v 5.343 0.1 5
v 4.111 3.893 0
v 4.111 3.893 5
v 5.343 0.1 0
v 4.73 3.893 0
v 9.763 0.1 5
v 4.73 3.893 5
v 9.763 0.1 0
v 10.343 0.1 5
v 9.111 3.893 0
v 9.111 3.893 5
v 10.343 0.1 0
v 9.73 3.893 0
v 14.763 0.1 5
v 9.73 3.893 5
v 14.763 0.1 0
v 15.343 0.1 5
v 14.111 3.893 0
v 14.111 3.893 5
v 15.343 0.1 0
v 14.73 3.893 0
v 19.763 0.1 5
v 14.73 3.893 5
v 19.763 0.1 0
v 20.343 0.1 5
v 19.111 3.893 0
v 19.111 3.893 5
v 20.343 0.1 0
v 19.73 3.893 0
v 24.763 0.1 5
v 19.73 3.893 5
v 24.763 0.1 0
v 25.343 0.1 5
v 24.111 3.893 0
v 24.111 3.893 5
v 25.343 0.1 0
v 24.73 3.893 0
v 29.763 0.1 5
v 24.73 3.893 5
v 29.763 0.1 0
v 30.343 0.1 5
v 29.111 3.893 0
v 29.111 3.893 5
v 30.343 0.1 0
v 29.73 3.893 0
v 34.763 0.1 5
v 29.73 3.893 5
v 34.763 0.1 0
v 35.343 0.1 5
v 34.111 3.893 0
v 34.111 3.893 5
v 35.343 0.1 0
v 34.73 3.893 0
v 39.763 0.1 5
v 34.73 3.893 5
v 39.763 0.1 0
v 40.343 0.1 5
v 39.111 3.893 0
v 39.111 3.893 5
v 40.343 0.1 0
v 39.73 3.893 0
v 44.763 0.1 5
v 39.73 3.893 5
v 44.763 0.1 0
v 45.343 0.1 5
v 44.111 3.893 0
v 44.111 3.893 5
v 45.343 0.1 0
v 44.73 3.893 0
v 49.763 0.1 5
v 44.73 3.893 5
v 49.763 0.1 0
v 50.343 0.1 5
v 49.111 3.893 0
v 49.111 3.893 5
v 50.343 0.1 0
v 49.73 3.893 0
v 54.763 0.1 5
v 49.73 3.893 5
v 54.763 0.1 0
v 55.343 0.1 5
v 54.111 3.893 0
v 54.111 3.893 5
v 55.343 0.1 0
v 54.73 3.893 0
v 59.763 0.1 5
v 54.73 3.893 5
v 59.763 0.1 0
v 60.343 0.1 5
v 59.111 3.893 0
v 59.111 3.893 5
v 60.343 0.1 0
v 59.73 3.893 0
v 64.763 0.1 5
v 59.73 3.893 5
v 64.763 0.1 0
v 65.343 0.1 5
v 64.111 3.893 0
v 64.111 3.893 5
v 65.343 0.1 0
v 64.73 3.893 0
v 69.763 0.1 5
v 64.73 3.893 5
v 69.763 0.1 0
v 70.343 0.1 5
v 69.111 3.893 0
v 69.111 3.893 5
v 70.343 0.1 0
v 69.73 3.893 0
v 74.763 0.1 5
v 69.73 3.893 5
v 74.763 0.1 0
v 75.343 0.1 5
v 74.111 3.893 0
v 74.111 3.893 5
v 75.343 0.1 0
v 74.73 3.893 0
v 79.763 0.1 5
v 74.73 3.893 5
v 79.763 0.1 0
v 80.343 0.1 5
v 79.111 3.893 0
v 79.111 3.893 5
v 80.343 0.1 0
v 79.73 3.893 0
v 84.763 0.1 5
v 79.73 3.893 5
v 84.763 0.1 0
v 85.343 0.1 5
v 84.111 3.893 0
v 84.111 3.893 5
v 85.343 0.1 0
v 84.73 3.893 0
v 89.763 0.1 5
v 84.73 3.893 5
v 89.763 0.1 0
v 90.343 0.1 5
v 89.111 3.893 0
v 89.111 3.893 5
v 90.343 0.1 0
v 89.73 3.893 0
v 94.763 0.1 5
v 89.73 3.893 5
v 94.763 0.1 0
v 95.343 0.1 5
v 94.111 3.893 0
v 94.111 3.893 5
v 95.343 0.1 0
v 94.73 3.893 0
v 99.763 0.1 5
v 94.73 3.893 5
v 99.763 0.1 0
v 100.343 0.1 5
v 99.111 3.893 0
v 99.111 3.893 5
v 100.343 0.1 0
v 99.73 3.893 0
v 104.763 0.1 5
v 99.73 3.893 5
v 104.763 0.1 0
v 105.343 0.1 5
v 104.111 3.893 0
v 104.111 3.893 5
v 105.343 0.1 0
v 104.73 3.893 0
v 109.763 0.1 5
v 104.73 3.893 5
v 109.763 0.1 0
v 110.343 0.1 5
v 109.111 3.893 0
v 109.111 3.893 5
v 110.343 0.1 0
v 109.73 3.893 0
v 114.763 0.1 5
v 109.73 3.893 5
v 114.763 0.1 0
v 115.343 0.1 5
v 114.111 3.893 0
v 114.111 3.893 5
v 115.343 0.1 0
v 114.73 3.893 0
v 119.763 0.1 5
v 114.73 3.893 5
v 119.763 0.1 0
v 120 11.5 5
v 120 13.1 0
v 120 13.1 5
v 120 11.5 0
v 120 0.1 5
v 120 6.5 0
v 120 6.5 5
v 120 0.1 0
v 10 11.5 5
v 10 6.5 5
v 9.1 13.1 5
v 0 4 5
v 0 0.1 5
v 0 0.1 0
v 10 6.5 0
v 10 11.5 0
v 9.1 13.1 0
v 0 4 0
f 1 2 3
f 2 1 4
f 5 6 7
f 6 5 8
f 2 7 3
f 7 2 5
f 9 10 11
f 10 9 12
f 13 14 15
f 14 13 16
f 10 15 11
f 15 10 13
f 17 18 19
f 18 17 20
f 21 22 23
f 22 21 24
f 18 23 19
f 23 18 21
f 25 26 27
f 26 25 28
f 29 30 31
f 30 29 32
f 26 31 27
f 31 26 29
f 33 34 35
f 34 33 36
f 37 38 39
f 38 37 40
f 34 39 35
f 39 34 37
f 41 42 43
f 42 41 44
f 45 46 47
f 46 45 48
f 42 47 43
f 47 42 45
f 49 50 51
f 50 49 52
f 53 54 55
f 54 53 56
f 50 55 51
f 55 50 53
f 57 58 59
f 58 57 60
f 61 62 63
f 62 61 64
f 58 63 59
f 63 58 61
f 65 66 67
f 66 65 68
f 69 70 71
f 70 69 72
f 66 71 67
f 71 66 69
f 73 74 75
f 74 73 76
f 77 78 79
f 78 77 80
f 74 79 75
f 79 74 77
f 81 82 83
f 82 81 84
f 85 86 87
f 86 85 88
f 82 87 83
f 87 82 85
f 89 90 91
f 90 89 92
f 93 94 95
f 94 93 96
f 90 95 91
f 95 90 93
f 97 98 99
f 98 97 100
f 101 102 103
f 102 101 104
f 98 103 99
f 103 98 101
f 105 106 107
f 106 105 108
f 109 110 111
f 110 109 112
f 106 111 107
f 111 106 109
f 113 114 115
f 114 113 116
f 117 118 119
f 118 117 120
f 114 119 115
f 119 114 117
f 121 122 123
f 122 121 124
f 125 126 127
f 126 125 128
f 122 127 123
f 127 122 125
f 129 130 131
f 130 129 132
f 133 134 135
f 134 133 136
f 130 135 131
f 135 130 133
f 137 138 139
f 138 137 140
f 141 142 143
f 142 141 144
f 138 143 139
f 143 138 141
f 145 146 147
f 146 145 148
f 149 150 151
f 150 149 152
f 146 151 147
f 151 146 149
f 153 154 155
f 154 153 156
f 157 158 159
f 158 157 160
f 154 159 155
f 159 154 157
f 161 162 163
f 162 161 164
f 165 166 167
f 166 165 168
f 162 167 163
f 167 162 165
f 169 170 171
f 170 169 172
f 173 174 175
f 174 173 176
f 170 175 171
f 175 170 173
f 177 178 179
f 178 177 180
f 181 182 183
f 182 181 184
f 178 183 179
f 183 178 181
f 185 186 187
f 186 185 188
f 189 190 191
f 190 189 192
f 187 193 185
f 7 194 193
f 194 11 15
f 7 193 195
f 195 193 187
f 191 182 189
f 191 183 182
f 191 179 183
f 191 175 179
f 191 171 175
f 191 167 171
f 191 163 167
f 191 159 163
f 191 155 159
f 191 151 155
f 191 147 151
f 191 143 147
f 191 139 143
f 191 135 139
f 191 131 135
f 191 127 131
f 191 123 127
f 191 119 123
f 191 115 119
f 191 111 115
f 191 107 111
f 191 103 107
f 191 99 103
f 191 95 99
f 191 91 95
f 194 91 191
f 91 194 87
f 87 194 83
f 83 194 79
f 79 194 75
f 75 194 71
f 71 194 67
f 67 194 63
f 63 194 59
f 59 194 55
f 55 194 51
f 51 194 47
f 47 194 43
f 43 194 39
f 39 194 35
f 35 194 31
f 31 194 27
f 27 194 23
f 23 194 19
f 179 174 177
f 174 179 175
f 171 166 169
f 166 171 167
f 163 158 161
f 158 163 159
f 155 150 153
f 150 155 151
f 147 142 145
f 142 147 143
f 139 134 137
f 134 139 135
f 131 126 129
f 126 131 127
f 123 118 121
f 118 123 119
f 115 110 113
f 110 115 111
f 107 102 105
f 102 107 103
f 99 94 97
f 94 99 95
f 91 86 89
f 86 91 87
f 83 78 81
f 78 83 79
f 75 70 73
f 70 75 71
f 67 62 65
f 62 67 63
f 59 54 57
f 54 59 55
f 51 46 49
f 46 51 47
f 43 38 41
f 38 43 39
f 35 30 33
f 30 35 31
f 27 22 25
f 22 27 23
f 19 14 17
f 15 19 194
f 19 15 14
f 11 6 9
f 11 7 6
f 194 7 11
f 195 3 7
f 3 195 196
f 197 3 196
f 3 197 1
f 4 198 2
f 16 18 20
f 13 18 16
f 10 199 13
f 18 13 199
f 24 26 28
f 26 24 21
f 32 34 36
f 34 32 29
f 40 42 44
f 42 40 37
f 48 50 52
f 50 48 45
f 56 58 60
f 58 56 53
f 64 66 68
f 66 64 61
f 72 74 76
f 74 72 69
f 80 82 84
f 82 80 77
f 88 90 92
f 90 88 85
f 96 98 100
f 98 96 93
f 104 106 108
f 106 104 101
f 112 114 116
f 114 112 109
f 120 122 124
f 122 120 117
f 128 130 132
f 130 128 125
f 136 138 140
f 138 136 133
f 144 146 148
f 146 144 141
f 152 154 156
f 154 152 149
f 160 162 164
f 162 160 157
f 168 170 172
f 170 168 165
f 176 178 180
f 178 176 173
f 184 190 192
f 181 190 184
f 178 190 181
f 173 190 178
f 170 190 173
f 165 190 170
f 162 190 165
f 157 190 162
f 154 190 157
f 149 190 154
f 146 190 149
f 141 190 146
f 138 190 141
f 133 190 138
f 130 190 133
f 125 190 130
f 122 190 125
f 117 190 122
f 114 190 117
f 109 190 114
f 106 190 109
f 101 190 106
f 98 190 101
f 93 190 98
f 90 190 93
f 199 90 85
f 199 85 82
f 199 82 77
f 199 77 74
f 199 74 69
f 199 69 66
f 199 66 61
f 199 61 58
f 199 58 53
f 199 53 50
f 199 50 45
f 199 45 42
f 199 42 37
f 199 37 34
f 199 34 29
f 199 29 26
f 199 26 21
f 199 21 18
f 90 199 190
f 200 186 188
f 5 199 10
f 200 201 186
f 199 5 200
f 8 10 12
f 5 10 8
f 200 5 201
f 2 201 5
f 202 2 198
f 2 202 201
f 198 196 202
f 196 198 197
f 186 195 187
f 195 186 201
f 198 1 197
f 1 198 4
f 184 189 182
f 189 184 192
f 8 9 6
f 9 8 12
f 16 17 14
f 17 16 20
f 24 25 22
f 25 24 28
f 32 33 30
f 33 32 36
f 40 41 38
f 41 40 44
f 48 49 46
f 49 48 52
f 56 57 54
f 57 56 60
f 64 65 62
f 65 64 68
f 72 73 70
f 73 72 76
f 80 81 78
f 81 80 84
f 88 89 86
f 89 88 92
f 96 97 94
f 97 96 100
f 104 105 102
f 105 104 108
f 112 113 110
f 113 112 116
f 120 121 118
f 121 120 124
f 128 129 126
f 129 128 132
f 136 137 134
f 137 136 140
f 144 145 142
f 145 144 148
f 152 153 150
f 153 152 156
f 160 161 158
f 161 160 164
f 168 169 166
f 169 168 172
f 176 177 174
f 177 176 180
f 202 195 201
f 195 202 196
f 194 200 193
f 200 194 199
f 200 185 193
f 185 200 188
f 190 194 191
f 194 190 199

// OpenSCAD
// Triggler Sled for Rubber Band Gun Barrel Module
// 2017 Chris Morrison


difference() {
translate ([0, 0.1, 0]) {cube ([120, 13, 5]);}  //main body
translate ([0, 4, 0]) rotate ([0, 0, 45]) {cube ([20, 20, 7]); } //Front wedge shape
translate ([10, 6.5, -1]) {cube ([120, 5, 7]); }  //Inner void

notch ();
translate ([5*1, 0, 0]) notch();
translate ([5*2, 0, 0]) notch();
translate ([5*3, 0, 0]) notch();
translate ([5*4, 0, 0]) notch();
translate ([5*5, 0, 0]) notch();
translate ([5*6, 0, 0]) notch();
translate ([5*7, 0, 0]) notch();
translate ([5*8, 0, 0]) notch();
translate ([5*9, 0, 0]) notch();
translate ([5*10, 0, 0]) notch();
translate ([5*11, 0, 0]) notch();
translate ([5*12, 0, 0]) notch();
translate ([5*13, 0, 0]) notch();
translate ([5*14, 0, 0]) notch();
translate ([5*15, 0, 0]) notch();
translate ([5*16, 0, 0]) notch();
translate ([5*17, 0, 0]) notch();
translate ([5*18, 0, 0]) notch();
translate ([5*19, 0, 0]) notch();
translate ([5*20, 0, 0]) notch();
translate ([5*21, 0, 0]) notch();
translate ([5*22, 0, 0]) notch();
}

module notch() {  //Use this module for Trigger Sled, Sub Frame, and Trigger
translate ([0, 0, 0]) {
translate ([7, -5, -1]) rotate([0,0,18]){  //Rotate the entire notch
difference() {
translate ([0, 0, 0]) {cube ([5, 10, 7]); }  //main vertical
translate ([0, 10, -1]) rotate ([0, 0, -55]) {cube ([9, 9, 9]); }  //back bevel
translate ([-2, 10, -1]) rotate ([0, 0, -18]) {cube ([5, 3, 9]); }  //trim top level
}
}
}
}
